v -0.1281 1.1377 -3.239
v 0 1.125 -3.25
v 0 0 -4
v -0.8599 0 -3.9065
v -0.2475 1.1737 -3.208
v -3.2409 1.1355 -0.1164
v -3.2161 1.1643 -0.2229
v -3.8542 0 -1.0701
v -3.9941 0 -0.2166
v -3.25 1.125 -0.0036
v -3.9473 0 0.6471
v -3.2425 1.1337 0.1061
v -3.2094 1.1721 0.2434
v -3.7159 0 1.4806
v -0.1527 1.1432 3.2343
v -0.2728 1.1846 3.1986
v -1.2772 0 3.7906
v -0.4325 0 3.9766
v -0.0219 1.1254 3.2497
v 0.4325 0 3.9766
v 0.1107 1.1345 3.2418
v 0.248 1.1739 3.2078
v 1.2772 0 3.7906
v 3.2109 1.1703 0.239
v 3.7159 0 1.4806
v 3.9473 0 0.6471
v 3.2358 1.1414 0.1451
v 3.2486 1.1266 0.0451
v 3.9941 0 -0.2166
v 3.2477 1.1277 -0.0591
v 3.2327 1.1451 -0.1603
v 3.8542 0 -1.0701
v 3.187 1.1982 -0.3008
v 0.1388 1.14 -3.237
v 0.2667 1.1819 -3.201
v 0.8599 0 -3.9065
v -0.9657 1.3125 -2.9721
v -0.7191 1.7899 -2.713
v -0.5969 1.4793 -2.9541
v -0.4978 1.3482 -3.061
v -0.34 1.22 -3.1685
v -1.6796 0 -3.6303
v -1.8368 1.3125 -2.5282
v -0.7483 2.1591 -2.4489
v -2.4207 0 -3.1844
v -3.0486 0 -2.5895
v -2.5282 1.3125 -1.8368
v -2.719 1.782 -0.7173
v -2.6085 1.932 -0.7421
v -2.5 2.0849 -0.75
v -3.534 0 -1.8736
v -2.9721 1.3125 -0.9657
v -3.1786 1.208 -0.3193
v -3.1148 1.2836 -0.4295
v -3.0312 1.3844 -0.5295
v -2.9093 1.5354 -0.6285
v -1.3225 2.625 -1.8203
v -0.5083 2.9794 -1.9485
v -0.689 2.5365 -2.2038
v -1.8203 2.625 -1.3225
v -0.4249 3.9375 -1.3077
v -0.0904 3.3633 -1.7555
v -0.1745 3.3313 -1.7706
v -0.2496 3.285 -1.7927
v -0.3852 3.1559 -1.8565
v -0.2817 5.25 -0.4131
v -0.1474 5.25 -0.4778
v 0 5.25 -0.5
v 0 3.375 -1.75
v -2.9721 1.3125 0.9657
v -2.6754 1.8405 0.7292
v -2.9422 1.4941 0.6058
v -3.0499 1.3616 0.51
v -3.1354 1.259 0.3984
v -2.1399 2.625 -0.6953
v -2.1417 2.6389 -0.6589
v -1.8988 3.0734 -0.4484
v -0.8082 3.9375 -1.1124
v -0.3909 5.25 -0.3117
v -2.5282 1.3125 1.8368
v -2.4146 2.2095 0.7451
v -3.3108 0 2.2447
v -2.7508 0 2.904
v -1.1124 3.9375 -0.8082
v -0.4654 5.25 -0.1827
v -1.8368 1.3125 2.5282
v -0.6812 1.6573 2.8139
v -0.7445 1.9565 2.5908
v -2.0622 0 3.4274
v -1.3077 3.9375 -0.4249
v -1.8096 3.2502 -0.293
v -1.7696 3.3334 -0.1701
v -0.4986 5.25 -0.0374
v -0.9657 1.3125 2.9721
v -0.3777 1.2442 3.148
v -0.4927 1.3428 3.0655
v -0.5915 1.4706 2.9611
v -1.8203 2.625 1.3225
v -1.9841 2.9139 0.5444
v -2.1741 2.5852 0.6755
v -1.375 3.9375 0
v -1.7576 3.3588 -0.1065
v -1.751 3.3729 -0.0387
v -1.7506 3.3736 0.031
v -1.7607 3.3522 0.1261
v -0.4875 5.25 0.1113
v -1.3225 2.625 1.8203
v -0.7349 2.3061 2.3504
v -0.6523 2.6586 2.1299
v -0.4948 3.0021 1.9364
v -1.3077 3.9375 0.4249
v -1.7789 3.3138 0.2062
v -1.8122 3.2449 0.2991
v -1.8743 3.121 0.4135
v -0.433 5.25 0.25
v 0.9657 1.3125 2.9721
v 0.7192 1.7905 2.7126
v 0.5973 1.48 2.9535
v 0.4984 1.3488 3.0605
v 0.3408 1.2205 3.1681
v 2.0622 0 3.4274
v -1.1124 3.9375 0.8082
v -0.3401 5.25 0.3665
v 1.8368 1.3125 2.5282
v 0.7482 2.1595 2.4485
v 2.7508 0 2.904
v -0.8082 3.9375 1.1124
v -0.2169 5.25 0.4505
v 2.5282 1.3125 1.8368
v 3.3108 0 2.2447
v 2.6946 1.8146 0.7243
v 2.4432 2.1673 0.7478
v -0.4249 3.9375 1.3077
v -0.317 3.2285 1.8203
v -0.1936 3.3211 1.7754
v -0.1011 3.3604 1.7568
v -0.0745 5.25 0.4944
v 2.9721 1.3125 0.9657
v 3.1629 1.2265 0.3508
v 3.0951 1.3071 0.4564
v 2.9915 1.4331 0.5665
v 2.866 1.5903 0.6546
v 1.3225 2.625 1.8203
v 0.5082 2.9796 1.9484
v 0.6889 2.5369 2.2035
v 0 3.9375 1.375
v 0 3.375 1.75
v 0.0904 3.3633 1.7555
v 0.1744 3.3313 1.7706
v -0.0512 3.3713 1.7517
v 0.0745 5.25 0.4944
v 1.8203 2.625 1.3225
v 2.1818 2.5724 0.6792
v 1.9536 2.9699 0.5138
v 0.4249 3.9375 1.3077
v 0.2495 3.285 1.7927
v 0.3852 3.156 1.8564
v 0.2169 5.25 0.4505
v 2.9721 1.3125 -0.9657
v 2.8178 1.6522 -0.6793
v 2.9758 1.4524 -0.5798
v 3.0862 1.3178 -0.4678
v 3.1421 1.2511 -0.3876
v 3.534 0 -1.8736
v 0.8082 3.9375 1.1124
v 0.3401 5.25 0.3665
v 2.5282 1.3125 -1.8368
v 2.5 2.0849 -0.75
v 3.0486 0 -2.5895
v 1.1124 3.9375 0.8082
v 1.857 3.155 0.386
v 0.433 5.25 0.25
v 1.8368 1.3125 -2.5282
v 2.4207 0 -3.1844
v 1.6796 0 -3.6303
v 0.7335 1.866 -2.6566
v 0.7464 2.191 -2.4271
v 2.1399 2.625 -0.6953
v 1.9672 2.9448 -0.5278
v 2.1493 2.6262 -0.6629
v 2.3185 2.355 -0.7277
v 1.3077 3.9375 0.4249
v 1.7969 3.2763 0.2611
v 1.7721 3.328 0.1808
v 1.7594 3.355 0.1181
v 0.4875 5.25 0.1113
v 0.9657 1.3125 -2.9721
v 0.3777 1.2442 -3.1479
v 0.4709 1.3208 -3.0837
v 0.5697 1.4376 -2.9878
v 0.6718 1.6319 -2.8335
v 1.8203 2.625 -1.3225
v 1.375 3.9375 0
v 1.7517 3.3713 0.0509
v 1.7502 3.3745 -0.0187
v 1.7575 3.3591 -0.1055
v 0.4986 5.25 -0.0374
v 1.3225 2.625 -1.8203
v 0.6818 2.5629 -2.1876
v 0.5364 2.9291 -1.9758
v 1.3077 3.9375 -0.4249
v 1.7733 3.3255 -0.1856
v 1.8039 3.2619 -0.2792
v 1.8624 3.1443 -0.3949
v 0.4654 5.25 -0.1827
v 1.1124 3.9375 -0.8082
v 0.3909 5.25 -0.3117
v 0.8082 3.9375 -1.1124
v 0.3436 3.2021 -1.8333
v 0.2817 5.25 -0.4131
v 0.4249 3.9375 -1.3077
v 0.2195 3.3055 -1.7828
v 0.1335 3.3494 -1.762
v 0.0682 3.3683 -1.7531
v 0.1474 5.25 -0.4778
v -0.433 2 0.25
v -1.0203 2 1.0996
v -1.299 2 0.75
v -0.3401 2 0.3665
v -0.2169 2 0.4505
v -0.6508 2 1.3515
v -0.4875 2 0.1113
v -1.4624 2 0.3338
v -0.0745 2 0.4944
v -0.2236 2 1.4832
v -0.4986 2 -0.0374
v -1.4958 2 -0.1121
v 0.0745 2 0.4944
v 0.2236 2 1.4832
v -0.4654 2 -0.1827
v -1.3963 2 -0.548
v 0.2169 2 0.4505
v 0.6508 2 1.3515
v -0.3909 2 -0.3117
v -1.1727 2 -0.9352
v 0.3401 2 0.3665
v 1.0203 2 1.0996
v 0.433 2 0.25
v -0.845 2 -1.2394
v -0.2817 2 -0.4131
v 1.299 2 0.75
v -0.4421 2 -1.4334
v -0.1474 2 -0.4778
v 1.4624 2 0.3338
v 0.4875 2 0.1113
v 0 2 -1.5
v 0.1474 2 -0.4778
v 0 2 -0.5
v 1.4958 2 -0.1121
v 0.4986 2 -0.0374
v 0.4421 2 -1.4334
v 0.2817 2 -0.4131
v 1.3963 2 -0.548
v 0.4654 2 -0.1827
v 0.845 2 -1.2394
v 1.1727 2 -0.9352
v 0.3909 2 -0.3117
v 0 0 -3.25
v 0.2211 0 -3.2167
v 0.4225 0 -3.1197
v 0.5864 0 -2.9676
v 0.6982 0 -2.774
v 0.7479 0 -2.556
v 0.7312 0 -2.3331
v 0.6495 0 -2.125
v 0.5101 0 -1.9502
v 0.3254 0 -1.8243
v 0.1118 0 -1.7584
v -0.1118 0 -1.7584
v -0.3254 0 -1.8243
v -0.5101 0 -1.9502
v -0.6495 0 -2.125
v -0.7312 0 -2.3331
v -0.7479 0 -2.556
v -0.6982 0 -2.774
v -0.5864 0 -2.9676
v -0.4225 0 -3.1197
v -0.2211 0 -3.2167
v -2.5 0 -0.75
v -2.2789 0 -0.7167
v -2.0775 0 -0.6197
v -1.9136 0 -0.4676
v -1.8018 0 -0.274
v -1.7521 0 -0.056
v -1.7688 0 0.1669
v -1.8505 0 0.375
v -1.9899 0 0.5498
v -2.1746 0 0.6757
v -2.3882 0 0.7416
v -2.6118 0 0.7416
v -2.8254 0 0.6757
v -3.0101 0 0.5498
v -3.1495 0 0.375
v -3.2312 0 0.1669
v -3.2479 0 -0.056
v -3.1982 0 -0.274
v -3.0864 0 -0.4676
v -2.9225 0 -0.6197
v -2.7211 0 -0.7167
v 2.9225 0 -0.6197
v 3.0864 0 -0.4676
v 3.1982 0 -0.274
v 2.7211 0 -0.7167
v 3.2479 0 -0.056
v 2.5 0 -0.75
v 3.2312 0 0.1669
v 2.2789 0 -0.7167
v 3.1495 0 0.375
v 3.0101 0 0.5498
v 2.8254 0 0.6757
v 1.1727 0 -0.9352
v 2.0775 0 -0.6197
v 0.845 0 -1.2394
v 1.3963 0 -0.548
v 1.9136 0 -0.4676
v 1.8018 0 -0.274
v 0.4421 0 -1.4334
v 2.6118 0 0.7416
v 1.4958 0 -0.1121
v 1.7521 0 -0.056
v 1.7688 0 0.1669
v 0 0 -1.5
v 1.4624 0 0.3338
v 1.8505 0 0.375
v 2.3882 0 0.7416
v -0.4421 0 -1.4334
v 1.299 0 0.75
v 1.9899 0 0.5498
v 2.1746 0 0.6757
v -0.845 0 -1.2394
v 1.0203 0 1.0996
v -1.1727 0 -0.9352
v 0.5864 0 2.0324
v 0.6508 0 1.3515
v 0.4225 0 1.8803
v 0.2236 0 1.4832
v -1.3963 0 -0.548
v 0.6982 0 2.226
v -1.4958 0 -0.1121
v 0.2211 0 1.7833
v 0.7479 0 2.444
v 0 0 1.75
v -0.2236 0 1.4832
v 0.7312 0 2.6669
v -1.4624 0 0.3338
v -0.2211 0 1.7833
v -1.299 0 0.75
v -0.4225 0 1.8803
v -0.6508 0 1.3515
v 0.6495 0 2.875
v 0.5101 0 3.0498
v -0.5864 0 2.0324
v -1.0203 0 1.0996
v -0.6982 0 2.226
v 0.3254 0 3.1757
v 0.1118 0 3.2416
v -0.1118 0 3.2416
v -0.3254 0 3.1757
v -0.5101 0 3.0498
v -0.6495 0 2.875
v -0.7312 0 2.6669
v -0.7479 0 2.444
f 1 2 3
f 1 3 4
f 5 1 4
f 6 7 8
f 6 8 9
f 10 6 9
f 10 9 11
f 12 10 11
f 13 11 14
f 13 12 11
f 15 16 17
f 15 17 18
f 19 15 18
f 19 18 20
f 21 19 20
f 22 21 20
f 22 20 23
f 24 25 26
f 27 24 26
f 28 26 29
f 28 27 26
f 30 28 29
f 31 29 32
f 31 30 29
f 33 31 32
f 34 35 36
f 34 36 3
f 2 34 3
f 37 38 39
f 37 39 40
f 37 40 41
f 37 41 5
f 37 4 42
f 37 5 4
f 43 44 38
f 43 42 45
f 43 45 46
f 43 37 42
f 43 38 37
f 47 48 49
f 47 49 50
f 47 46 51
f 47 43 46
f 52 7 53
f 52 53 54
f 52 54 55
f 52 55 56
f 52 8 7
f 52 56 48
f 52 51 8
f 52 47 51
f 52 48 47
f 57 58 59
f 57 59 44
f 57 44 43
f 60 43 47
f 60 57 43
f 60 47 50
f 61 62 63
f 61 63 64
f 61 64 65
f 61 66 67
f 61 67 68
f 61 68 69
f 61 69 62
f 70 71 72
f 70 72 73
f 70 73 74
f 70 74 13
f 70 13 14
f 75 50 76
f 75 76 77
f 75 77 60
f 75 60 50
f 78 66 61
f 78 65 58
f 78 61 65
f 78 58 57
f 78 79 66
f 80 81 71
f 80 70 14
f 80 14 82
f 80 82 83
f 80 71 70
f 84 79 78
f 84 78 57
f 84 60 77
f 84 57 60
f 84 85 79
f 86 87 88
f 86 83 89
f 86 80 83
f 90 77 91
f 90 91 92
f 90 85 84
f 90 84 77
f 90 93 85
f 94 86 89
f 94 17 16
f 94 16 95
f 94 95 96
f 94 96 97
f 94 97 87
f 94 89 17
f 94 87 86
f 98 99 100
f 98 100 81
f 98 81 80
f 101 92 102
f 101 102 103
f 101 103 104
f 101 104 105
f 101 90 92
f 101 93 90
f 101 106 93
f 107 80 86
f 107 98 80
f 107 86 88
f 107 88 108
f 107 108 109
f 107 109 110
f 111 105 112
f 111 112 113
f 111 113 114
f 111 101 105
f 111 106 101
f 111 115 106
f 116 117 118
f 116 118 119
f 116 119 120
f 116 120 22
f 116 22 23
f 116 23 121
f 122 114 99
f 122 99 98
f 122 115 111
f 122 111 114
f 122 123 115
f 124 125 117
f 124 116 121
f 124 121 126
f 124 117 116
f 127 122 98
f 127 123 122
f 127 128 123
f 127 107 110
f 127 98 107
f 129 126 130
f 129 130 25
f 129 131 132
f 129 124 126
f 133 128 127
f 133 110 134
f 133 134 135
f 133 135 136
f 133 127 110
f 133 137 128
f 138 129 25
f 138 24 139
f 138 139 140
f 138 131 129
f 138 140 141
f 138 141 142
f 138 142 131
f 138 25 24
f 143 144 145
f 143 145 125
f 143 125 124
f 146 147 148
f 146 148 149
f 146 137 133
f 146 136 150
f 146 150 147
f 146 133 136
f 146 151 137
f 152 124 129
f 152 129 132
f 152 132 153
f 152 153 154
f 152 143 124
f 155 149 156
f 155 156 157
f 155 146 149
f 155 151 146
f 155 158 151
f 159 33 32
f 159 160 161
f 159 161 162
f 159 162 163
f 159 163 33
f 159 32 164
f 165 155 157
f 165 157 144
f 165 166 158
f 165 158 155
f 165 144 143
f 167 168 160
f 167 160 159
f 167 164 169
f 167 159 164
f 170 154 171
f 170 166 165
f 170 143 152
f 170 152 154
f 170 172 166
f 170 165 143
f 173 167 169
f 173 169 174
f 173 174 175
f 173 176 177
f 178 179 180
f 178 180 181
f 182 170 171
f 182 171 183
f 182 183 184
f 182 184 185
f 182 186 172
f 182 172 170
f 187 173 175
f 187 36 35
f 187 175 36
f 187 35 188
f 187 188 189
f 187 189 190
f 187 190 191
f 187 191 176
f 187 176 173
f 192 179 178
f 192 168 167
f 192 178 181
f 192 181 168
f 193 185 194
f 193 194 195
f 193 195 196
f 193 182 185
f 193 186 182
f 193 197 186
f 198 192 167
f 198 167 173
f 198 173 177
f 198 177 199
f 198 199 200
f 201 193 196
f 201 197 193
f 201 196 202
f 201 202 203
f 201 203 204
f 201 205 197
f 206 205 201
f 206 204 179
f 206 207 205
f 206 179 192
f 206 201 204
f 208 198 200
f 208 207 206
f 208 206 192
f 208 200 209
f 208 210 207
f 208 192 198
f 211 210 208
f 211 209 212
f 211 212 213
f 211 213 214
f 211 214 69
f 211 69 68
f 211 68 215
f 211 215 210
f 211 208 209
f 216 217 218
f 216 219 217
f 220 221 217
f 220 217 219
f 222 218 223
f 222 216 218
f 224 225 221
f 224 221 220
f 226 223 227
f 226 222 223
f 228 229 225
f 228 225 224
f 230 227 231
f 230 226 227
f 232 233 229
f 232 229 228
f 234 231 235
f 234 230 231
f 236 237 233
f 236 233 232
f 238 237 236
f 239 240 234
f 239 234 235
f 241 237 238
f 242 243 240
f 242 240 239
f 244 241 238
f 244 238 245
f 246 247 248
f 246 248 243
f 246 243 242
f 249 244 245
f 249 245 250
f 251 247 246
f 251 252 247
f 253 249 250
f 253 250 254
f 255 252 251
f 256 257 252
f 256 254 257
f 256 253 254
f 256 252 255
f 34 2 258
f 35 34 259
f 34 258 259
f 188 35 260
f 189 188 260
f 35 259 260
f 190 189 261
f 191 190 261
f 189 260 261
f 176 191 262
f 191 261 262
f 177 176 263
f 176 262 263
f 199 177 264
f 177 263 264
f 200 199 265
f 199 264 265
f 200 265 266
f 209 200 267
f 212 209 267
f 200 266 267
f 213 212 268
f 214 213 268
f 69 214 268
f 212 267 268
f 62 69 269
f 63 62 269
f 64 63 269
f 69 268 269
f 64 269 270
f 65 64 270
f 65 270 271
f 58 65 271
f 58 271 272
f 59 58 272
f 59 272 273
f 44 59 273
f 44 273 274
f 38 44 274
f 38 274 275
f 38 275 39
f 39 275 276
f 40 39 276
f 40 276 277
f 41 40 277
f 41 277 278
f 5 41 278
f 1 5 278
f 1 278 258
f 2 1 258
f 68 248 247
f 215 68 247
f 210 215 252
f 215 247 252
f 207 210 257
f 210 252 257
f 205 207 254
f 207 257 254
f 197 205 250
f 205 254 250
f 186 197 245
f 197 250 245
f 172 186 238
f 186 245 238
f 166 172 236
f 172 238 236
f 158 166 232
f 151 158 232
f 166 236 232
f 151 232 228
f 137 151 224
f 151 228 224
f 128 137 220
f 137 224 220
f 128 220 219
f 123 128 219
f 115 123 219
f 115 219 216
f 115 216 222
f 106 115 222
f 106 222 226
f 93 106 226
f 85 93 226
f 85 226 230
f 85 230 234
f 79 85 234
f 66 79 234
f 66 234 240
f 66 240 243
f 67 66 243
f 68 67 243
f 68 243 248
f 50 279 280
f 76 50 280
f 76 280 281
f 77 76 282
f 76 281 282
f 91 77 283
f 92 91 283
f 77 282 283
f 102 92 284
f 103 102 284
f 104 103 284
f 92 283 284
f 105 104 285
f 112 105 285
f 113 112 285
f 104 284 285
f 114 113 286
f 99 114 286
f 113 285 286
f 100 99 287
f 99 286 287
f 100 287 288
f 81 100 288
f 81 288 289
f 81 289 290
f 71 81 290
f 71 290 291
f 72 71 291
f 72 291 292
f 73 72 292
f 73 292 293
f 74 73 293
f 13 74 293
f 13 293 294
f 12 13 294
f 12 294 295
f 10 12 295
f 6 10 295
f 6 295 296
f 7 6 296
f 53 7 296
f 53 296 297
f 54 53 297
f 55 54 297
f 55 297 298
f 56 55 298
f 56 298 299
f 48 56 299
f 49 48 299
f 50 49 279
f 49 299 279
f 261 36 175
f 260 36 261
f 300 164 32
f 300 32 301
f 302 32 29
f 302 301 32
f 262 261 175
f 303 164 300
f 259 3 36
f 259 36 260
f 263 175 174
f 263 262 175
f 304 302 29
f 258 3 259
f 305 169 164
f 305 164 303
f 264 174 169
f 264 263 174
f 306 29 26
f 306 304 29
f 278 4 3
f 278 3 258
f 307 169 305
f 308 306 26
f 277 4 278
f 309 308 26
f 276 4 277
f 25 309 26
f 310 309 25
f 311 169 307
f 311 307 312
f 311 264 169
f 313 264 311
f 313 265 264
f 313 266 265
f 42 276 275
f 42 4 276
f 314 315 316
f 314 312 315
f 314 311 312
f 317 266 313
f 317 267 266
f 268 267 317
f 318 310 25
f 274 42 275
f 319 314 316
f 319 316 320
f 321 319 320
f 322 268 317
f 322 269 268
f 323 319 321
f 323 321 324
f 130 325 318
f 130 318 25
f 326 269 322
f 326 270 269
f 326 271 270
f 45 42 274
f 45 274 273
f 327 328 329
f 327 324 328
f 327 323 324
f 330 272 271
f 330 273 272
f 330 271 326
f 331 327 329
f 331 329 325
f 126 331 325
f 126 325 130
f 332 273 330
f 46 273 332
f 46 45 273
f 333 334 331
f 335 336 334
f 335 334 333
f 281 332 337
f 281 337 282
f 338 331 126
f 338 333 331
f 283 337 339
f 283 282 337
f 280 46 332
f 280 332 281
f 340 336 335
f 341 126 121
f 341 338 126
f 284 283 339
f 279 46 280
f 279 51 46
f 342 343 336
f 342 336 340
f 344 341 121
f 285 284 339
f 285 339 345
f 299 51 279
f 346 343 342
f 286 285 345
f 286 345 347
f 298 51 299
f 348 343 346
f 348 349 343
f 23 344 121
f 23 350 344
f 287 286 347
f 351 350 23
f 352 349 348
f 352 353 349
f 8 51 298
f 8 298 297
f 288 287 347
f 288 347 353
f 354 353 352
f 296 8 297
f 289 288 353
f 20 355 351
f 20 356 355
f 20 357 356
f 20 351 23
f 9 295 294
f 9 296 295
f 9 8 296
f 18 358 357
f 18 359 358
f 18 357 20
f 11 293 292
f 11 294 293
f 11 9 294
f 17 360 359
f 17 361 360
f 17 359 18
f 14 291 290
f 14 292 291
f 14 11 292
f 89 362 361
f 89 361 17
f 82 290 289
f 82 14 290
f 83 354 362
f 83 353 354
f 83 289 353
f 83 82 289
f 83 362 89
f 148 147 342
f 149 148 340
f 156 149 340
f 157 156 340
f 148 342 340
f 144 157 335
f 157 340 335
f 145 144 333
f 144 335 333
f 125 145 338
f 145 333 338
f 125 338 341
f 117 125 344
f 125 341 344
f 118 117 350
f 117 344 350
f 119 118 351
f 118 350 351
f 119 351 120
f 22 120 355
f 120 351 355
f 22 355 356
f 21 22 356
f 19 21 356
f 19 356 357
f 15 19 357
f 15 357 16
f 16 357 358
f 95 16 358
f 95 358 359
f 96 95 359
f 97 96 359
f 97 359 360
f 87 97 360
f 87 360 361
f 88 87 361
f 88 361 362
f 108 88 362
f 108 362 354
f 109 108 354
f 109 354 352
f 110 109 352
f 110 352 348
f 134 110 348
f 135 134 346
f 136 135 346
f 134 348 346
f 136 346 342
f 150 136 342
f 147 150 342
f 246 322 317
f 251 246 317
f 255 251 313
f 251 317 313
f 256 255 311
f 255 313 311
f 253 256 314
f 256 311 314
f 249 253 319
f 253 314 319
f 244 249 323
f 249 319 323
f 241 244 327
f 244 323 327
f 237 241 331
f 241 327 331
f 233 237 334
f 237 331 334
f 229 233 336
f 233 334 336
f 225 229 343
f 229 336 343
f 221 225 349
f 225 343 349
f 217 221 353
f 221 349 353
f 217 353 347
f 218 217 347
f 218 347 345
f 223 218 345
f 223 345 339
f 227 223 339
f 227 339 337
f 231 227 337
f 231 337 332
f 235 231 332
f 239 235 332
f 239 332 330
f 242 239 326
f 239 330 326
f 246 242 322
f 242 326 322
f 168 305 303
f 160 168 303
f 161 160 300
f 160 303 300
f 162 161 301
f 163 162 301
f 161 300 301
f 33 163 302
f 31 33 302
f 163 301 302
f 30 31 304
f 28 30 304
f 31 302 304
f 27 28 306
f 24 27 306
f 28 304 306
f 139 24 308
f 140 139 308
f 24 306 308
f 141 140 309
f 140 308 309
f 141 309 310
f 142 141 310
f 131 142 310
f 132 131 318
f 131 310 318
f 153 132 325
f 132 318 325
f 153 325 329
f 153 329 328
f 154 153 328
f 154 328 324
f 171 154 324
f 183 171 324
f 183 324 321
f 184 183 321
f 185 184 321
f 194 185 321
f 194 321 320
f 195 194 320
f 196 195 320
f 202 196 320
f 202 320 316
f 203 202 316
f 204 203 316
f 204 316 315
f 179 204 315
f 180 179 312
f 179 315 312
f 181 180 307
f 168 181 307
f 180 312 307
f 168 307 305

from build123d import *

# Parameters (mm, degrees)
SKETCH3_R          = 0.75
SKETCH3_R_2        = 0.5
CUT_EXTRUDE1_DEPTH = 6
SKETCH3_3_R        = 1.5
CUT_EXTRUDE2_DEPTH = 2


with BuildPart() as part:
    # Sketch1 → Revolve1 (revolve)
    with BuildSketch(Plane(origin=(0, 0, 0), x_dir=(0, 0, -1), z_dir=(1, 0, 0))):
        Polygon((0, 0), (4, 0), (0, 6), align=None)
    revolve(axis=Axis((0, -11.26056338, 0), (0, 1, 0)))

    # Sketch3 → Cut-Extrude1 (cut)
    with BuildSketch(Plane.XZ):
        with Locations((0, -2.5)):
            Circle(SKETCH3_R)
        with Locations((0, 2.5)):
            Circle(SKETCH3_R)
        with Locations((-2.5, 0)):
            Circle(SKETCH3_R)
        with Locations((2.5, 0)):
            Circle(SKETCH3_R)
        Circle(SKETCH3_R_2)
    extrude(amount=-CUT_EXTRUDE1_DEPTH, mode=Mode.SUBTRACT)

    # Sketch3<3> → Cut-Extrude2 (cut)
    with BuildSketch(Plane.XZ):
        Circle(SKETCH3_3_R)
    extrude(amount=-CUT_EXTRUDE2_DEPTH, mode=Mode.SUBTRACT)


solid = part.part
